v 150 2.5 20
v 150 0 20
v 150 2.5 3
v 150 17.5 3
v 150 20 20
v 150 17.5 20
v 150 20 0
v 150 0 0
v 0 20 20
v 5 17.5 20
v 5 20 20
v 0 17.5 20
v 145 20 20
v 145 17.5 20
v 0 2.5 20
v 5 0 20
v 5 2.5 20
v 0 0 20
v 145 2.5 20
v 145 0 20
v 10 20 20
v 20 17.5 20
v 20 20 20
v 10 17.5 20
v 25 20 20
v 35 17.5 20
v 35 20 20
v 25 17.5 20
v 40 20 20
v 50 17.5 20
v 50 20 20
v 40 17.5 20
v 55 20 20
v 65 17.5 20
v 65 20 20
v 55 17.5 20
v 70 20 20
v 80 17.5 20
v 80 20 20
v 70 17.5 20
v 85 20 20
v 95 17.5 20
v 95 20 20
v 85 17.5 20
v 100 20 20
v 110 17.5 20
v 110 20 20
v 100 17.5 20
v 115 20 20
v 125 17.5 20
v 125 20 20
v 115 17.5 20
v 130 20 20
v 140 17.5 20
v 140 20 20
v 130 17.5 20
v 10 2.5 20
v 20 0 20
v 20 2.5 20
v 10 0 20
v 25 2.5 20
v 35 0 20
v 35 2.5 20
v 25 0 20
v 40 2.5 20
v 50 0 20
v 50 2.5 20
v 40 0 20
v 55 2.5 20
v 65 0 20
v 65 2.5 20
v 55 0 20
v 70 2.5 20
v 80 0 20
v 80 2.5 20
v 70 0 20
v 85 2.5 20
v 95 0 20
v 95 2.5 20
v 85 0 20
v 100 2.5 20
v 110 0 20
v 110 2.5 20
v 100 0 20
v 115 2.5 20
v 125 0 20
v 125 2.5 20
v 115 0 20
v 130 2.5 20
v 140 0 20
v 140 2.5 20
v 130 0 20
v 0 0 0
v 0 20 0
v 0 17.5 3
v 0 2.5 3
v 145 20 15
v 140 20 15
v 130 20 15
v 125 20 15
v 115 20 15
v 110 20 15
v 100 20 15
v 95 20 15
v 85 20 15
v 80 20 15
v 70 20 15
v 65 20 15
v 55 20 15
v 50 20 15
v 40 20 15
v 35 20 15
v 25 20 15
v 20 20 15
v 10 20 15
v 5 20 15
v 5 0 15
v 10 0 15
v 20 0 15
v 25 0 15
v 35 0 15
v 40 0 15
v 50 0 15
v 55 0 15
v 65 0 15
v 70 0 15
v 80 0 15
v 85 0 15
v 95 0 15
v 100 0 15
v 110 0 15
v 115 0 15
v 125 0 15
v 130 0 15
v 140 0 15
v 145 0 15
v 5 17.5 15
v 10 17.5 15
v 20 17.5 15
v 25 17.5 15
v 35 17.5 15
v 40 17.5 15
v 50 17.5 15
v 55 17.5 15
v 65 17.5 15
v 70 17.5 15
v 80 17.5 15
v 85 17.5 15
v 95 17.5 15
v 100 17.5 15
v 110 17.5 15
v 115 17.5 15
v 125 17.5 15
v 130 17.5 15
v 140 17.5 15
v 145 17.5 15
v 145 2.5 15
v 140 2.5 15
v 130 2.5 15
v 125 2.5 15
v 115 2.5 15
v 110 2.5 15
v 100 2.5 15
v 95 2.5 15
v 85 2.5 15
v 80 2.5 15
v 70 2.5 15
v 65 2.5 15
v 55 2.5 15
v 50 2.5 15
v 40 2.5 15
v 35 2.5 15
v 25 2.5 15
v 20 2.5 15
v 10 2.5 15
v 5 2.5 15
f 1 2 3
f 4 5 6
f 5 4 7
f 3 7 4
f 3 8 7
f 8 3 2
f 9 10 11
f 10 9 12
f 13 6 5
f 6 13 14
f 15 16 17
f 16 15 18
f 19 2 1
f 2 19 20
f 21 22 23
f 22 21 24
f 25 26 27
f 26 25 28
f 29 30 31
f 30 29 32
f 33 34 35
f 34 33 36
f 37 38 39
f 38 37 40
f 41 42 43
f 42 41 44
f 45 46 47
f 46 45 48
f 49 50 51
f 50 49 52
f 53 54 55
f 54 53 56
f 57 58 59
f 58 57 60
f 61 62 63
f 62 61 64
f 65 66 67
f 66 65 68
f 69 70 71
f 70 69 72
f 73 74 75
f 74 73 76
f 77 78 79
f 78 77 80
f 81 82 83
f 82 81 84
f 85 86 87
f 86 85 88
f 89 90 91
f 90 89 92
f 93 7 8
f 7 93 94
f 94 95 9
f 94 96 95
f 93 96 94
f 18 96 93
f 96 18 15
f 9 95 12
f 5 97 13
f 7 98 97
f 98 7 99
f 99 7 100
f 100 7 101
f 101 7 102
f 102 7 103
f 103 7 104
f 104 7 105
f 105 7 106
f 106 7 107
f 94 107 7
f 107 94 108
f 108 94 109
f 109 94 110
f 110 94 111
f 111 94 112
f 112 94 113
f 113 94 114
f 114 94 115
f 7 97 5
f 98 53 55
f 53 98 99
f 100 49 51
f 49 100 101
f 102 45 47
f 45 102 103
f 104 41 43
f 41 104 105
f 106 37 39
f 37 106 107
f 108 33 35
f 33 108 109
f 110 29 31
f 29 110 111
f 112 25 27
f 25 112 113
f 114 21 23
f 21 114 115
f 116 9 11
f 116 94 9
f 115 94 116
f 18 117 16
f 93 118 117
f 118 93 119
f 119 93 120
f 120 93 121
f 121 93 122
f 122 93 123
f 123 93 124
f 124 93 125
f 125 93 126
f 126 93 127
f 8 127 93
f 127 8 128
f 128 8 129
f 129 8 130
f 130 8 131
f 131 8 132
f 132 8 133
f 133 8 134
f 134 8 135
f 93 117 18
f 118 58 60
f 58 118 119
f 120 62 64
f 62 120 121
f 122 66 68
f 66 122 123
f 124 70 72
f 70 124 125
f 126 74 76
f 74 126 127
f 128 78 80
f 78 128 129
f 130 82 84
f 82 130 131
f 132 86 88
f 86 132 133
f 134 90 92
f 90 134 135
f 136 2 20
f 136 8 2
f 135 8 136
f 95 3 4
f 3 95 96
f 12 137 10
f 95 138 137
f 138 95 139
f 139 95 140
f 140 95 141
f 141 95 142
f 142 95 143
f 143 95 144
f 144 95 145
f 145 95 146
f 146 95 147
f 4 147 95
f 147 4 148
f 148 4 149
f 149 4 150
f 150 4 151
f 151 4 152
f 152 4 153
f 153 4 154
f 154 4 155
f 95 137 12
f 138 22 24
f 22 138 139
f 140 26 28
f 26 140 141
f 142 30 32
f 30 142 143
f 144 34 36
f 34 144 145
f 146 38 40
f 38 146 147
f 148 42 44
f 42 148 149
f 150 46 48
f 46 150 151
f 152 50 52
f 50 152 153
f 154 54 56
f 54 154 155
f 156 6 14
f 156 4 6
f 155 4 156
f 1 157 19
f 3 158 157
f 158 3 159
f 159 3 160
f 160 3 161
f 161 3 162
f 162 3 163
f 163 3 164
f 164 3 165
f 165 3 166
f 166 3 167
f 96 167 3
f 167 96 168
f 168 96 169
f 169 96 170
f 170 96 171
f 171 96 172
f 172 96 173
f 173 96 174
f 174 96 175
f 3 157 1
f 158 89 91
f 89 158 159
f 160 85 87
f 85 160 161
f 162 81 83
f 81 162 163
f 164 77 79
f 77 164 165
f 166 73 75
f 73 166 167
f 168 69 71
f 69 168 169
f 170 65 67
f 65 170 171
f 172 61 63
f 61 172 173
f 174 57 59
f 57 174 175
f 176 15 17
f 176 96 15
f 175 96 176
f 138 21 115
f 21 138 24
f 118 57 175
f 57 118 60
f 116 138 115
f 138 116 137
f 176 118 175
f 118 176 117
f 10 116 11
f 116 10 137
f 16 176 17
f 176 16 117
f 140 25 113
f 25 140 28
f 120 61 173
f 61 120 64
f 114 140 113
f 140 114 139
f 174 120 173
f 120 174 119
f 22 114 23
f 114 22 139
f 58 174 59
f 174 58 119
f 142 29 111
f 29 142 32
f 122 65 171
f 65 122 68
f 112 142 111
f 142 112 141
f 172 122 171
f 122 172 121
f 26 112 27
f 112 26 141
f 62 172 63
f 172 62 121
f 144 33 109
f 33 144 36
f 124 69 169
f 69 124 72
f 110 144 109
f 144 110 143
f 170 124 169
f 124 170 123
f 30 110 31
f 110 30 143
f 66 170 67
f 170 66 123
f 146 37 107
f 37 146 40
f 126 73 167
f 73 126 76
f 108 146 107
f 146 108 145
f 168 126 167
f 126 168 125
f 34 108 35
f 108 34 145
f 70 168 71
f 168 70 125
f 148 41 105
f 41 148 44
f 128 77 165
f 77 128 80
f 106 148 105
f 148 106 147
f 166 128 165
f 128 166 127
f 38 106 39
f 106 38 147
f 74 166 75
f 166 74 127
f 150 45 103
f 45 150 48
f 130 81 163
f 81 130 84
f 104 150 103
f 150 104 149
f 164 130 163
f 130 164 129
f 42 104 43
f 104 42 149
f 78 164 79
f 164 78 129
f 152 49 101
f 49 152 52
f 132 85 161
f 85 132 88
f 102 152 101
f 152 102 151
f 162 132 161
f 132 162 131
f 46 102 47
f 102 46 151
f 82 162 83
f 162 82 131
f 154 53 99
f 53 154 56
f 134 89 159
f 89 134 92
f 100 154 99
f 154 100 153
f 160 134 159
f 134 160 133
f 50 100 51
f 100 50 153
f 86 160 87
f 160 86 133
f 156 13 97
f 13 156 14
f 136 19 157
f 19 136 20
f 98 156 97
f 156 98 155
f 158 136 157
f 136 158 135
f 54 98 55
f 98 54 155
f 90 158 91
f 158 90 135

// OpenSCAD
$fn = 32;

// ----------------------------------------------------------------------
// Cable duct: 150 x 20 x 20 mm, 10 fingers
// ----------------------------------------------------------------------

// --- parameters (mm) ---
channel_l = 150;          // duct length, X
channel_w = 20;           // duct width, Y
channel_h = 20;           // duct height, Z
channel_t = 2.5;          // side wall thickness
floor_t = 3;              // floor thickness
slot_w = 5;               // finger slot width
slot_h = 12;              // finger slot height
fingers = 10;             // number of finger slots per side
pitch = 15;               // finger pitch

module shell() {
  difference() {
    cube([channel_l, channel_w, channel_h]);
    /* open top channel */
    translate([-channel_t - 1, channel_t, floor_t])
      cube([channel_l + 2 * channel_t + 2, channel_w - 2 * channel_t, channel_h + 1]);
  }
}

difference() {
  union() {
    shell();
  }
  /* finger slots cut through both side walls */
  for (i = [0 : fingers - 1]) translate([pitch / 2 + i * pitch - slot_w / 2, -1, floor_t + slot_h]) cube([slot_w, channel_w + 2, channel_h]);
}
